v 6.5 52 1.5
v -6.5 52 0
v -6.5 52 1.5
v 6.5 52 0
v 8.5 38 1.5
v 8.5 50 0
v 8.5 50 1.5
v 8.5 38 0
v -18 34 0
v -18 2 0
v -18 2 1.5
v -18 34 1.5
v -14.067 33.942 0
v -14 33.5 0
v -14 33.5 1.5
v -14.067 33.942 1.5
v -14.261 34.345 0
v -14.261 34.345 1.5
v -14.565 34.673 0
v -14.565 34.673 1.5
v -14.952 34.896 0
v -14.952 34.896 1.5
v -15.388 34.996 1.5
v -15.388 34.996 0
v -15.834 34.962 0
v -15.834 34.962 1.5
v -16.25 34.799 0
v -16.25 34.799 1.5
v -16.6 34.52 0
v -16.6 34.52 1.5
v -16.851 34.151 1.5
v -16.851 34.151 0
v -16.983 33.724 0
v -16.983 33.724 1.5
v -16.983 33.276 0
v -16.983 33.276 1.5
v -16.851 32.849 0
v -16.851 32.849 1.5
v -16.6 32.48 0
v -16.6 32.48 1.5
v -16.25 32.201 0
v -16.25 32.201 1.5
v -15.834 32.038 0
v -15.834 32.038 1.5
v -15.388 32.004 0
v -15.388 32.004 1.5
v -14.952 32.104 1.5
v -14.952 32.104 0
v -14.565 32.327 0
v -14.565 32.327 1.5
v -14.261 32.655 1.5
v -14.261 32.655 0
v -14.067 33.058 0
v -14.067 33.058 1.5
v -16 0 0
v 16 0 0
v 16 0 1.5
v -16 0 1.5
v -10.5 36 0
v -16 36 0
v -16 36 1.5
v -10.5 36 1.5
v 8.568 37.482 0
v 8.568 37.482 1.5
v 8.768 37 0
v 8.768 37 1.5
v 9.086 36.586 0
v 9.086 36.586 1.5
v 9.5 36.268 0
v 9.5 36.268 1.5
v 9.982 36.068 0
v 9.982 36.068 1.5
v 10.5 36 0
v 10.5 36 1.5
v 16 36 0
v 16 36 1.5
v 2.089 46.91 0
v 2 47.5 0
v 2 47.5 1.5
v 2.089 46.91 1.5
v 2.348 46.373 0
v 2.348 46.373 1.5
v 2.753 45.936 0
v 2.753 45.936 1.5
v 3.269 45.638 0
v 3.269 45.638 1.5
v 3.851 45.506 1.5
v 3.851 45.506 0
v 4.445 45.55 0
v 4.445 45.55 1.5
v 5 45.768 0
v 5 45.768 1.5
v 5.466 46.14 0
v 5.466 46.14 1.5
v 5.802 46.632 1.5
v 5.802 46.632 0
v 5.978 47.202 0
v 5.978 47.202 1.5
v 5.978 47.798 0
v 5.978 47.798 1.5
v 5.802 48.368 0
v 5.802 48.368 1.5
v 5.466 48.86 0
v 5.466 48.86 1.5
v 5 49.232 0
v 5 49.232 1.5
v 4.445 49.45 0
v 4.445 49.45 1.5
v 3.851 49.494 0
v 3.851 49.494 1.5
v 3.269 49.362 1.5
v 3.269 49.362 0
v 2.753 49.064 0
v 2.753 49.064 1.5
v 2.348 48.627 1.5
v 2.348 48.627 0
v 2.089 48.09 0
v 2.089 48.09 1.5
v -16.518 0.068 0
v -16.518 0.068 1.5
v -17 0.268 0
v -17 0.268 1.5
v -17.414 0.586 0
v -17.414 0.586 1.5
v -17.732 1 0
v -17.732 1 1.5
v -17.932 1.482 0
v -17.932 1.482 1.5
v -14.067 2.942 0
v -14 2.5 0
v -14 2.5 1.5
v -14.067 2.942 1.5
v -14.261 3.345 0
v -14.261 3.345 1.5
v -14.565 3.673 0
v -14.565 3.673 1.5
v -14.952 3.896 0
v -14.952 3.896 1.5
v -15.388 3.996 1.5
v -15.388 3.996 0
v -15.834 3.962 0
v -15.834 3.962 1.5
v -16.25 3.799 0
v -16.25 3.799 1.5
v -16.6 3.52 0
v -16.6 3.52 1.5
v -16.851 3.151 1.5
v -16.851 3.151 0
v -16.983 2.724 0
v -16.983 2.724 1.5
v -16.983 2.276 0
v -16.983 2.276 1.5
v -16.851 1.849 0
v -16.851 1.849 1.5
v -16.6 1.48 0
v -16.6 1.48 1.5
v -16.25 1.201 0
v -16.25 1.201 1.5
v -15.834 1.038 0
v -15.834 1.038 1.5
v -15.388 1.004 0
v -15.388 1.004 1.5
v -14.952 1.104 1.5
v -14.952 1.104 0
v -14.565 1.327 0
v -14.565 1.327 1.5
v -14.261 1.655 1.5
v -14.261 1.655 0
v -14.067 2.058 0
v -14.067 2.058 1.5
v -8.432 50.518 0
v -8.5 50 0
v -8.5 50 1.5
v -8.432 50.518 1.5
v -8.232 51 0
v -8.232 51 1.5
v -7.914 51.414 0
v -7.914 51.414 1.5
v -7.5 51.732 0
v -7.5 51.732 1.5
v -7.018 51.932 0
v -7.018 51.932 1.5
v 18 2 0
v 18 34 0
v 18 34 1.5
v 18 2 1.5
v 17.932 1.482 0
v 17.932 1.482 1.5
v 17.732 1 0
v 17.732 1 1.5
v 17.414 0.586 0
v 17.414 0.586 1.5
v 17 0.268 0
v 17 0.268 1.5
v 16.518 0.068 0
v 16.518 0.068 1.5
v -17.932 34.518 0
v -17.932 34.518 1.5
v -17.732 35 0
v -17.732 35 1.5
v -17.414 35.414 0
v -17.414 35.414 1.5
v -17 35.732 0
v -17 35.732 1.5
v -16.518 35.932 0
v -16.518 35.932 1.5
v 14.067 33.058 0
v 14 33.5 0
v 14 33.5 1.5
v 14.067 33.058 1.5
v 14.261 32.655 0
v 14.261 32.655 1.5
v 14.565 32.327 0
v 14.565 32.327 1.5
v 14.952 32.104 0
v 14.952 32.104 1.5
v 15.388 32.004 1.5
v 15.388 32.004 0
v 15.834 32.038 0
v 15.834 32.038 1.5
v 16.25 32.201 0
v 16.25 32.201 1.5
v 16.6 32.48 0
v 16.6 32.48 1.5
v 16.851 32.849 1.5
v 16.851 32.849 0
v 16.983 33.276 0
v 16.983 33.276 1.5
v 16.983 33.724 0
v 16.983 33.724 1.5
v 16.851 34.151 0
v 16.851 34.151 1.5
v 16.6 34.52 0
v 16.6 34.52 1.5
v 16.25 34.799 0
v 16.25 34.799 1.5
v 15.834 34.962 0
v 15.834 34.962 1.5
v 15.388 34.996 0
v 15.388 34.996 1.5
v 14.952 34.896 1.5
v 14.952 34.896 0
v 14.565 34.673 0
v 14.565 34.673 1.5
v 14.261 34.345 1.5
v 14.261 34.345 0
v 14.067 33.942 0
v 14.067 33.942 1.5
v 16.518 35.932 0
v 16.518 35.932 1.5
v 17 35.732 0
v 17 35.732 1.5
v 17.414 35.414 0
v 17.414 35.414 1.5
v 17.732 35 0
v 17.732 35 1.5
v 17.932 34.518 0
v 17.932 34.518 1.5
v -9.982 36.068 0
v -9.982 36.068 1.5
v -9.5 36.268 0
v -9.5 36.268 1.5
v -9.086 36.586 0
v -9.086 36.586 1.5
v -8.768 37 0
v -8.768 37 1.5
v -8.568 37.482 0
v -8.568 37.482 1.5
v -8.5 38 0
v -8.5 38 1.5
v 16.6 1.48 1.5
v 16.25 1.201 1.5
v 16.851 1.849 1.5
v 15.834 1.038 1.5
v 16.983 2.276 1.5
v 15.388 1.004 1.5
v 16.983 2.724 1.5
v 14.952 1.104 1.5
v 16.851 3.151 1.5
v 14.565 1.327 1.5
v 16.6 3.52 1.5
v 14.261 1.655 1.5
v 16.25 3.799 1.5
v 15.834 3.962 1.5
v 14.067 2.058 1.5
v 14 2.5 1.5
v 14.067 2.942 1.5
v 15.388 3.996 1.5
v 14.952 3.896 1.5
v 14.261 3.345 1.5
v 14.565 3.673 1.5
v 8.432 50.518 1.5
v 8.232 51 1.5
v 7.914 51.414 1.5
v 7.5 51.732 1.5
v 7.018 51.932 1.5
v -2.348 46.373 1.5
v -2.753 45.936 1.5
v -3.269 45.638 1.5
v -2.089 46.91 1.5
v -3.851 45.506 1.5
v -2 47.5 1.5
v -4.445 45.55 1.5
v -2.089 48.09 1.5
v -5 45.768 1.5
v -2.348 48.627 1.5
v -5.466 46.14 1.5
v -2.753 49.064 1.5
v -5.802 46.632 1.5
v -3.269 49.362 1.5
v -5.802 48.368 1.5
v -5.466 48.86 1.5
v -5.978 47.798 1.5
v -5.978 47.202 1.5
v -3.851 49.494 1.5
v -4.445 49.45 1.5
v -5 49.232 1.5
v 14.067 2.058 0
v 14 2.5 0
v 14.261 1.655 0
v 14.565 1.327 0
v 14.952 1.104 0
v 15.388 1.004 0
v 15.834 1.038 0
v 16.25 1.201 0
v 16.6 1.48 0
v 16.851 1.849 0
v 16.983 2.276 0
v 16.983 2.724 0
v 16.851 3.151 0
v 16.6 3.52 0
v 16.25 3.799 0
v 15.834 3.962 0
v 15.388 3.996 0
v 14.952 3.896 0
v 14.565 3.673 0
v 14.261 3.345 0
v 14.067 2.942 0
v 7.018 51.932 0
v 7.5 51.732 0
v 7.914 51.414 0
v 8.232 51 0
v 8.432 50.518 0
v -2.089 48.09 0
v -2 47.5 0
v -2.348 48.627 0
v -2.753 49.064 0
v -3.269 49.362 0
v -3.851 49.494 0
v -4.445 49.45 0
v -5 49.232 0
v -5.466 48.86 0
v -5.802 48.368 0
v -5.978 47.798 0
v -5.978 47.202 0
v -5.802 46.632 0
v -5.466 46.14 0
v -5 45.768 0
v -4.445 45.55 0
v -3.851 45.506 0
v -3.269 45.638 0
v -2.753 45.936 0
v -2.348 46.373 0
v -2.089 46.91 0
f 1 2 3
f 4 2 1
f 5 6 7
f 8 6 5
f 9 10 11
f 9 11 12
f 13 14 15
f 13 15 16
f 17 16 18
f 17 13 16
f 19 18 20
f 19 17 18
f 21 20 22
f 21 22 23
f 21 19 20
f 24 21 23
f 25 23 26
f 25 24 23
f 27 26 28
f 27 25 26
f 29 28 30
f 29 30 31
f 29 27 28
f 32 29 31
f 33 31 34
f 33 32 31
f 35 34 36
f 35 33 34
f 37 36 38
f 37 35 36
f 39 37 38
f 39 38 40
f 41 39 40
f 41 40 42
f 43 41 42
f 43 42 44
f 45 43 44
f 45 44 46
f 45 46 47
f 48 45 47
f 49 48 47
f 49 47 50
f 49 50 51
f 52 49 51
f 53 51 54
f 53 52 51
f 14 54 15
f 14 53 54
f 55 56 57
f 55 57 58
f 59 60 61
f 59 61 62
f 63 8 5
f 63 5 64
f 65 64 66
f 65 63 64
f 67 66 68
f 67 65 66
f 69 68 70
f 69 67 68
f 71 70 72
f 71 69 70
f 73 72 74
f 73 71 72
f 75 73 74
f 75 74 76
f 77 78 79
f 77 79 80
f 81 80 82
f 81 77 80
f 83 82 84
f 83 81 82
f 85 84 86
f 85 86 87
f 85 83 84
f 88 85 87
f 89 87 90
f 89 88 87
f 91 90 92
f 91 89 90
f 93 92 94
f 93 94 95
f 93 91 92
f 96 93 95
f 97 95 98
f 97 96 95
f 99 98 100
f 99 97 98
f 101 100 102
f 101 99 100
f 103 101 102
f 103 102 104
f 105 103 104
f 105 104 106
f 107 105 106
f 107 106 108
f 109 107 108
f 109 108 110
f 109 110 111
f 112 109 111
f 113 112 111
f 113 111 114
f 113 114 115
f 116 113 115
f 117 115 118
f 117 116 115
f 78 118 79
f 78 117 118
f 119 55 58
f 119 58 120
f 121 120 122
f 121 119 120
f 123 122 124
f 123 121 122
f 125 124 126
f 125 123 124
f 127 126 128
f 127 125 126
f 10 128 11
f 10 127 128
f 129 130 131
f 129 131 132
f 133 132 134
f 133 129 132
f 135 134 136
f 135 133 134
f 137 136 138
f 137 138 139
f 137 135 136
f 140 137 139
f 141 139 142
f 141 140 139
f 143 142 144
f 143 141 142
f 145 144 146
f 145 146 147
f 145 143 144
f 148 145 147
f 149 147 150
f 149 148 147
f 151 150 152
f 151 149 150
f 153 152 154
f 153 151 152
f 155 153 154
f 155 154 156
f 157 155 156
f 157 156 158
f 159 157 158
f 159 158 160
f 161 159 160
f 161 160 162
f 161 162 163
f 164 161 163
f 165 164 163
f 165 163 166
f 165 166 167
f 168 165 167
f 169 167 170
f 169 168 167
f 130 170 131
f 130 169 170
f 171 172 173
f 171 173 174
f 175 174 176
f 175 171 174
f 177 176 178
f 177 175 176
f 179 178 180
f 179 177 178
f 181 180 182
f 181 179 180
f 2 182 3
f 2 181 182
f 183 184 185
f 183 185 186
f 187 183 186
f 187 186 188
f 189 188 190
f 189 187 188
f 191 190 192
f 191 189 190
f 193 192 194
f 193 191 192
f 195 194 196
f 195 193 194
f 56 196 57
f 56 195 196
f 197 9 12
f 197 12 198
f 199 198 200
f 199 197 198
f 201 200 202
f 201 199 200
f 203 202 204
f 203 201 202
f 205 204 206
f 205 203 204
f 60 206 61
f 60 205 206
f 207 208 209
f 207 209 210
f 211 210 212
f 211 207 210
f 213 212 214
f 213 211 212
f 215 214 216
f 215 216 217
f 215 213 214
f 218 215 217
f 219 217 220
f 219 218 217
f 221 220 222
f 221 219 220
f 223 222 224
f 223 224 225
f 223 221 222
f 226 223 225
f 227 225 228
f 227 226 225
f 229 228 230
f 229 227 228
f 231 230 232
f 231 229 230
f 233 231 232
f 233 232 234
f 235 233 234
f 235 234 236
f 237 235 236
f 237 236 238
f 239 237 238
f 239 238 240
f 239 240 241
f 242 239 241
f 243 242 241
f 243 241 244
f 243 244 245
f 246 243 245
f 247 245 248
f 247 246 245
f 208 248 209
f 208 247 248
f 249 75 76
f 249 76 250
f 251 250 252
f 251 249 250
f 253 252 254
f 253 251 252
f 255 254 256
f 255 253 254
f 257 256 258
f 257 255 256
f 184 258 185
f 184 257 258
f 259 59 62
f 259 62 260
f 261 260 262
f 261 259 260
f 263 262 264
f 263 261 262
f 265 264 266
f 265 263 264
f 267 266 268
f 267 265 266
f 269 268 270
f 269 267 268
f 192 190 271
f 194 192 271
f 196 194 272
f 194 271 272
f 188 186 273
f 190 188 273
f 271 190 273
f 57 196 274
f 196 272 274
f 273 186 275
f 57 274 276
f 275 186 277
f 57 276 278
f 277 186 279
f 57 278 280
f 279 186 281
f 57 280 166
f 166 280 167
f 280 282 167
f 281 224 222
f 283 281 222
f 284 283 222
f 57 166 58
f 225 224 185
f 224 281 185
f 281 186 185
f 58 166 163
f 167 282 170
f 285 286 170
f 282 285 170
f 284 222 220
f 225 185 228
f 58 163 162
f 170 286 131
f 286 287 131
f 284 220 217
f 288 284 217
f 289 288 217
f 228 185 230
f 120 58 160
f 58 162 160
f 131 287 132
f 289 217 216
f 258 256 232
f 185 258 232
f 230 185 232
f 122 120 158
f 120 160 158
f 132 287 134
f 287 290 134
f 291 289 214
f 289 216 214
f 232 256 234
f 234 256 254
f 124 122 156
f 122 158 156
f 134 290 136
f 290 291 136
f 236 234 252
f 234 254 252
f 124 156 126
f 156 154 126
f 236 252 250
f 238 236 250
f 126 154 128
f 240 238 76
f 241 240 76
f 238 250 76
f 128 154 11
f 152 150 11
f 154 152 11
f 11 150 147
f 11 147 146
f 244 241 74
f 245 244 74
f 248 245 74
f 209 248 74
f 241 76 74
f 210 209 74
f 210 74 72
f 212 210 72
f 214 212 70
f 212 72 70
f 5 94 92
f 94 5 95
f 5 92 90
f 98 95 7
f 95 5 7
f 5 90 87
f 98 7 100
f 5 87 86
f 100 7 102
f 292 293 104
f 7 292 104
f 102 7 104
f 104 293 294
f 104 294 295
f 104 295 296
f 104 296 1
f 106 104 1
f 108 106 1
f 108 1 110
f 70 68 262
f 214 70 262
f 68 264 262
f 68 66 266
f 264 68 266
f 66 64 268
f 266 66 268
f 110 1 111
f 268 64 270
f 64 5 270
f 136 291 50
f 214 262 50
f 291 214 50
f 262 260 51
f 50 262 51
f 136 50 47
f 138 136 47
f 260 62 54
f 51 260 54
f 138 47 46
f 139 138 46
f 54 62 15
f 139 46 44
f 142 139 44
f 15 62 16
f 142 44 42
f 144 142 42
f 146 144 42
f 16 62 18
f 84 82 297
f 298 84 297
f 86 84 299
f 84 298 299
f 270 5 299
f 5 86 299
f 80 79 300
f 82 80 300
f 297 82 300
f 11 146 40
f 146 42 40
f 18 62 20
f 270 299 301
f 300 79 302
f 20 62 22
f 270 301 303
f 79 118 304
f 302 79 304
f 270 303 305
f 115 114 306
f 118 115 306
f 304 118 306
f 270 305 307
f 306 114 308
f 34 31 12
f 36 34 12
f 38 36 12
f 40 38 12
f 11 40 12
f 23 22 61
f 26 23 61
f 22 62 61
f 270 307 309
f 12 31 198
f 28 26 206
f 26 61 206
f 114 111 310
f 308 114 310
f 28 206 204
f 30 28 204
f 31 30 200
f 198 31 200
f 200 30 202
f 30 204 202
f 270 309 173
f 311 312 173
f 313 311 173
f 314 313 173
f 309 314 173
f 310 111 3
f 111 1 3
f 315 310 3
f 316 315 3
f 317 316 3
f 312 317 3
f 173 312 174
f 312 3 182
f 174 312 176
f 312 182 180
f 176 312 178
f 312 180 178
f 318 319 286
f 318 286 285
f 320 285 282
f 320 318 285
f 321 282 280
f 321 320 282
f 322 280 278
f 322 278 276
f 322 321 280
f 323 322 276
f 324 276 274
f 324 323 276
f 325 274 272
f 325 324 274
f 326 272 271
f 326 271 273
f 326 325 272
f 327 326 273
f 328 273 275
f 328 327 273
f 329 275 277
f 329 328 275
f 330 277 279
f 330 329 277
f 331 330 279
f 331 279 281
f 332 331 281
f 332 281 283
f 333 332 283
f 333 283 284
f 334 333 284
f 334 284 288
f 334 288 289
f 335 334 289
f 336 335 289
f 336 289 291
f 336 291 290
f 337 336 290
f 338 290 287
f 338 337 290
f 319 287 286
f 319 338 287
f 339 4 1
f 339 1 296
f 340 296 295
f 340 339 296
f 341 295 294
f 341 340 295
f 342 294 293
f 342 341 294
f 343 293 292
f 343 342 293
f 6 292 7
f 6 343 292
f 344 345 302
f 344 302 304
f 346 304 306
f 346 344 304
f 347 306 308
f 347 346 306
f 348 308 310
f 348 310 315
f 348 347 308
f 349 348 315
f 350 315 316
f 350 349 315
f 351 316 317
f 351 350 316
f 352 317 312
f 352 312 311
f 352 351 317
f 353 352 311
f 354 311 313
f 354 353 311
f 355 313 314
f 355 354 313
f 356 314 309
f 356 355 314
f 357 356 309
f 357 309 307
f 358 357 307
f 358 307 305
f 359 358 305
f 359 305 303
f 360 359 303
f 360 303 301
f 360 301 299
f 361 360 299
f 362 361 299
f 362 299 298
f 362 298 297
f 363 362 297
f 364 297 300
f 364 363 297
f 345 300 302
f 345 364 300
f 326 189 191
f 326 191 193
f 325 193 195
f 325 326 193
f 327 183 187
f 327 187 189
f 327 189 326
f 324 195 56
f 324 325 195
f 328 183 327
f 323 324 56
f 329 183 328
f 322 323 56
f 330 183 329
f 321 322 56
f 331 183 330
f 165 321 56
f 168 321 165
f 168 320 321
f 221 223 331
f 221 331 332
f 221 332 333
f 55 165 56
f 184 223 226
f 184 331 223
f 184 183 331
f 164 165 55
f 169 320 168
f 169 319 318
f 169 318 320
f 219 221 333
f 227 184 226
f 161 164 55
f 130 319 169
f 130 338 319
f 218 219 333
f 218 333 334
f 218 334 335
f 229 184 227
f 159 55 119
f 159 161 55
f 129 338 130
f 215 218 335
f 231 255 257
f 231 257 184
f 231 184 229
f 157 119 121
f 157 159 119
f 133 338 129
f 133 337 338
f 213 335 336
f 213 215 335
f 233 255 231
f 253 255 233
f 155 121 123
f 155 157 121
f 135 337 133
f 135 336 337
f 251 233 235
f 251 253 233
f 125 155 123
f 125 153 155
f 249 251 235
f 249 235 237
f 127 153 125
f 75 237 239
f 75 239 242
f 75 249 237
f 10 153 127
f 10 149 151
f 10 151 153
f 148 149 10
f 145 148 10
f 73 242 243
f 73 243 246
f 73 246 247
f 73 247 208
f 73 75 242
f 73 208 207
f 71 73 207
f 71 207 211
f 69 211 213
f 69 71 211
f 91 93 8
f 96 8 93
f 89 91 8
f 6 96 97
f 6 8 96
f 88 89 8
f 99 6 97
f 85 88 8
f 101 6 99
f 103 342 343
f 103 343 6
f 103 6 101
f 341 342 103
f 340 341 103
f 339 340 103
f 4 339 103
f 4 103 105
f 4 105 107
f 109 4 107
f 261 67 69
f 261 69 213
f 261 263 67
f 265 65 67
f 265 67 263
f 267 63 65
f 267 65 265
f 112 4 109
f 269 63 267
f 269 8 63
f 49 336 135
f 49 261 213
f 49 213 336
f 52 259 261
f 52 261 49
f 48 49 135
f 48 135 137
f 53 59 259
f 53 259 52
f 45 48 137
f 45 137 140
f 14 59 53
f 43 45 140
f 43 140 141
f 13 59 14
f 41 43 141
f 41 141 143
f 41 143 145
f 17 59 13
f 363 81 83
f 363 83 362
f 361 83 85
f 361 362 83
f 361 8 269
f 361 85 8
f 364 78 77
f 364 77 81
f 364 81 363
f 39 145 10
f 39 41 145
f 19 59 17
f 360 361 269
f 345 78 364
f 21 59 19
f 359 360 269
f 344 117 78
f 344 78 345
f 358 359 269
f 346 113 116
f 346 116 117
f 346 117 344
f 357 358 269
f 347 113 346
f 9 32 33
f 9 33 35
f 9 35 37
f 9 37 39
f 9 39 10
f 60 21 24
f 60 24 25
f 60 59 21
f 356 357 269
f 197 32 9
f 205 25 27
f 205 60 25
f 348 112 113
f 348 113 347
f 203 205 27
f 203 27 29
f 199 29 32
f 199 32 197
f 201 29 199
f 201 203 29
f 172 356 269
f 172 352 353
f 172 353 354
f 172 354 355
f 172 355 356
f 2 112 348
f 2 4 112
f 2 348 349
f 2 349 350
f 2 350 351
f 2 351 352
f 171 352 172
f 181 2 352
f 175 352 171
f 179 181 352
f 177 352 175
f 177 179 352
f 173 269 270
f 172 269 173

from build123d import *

# Parameters (mm, degrees)
CROQUIS1_R              = 1.5
CROQUIS1_R_2            = 2
SALIENTE_EXTRUIR1_DEPTH = 1.5


with BuildPart() as part:
    # Croquis1 → Saliente-Extruir1 (new body)
    with BuildSketch(Plane.XY):
        with BuildLine():
            Line((0, 0), (-16, 0))
            ThreePointArc((-16, 0), (-17.414213562, 0.585786438), (-18, 2))
            Line((-18, 2), (-18, 34))
            ThreePointArc((-18, 34), (-17.414213562, 35.414213562), (-16, 36))
            Line((-16, 36), (-10.5, 36))
            ThreePointArc((-10.5, 36), (-9.085786438, 36.585786438), (-8.5, 38))
            Line((-8.5, 38), (-8.5, 50))
            ThreePointArc((-8.5, 50), (-7.914213562, 51.414213562), (-6.5, 52))
            Line((-6.5, 52), (0, 52))
            Line((0, 52), (6.5, 52))
            ThreePointArc((6.5, 52), (7.914213562, 51.414213562), (8.5, 50))
            Line((8.5, 50), (8.5, 38))
            ThreePointArc((8.5, 38), (9.085786438, 36.585786438), (10.5, 36))
            Line((10.5, 36), (16, 36))
            ThreePointArc((16, 36), (17.414213562, 35.414213562), (18, 34))
            Line((18, 34), (18, 2))
            ThreePointArc((18, 2), (17.414213562, 0.585786438), (16, 0))
            Line((16, 0), (0, 0))
        make_face()
        with Locations((-15.5, 2.5)):
            Circle(CROQUIS1_R, mode=Mode.SUBTRACT)
        with Locations((-15.5, 33.5)):
            Circle(CROQUIS1_R, mode=Mode.SUBTRACT)
        with Locations((-4, 47.5)):
            Circle(CROQUIS1_R_2, mode=Mode.SUBTRACT)
        with Locations(Location((4, 47.5, 0), (0, 0, 180))):
            Circle(CROQUIS1_R_2, mode=Mode.SUBTRACT)
        with Locations(Location((15.5, 33.5, 0), (0, 0, 180))):
            Circle(CROQUIS1_R, mode=Mode.SUBTRACT)
        with Locations(Location((15.5, 2.5, 0), (0, 0, 180))):
            Circle(CROQUIS1_R, mode=Mode.SUBTRACT)
    extrude(amount=SALIENTE_EXTRUIR1_DEPTH)


solid = part.part
